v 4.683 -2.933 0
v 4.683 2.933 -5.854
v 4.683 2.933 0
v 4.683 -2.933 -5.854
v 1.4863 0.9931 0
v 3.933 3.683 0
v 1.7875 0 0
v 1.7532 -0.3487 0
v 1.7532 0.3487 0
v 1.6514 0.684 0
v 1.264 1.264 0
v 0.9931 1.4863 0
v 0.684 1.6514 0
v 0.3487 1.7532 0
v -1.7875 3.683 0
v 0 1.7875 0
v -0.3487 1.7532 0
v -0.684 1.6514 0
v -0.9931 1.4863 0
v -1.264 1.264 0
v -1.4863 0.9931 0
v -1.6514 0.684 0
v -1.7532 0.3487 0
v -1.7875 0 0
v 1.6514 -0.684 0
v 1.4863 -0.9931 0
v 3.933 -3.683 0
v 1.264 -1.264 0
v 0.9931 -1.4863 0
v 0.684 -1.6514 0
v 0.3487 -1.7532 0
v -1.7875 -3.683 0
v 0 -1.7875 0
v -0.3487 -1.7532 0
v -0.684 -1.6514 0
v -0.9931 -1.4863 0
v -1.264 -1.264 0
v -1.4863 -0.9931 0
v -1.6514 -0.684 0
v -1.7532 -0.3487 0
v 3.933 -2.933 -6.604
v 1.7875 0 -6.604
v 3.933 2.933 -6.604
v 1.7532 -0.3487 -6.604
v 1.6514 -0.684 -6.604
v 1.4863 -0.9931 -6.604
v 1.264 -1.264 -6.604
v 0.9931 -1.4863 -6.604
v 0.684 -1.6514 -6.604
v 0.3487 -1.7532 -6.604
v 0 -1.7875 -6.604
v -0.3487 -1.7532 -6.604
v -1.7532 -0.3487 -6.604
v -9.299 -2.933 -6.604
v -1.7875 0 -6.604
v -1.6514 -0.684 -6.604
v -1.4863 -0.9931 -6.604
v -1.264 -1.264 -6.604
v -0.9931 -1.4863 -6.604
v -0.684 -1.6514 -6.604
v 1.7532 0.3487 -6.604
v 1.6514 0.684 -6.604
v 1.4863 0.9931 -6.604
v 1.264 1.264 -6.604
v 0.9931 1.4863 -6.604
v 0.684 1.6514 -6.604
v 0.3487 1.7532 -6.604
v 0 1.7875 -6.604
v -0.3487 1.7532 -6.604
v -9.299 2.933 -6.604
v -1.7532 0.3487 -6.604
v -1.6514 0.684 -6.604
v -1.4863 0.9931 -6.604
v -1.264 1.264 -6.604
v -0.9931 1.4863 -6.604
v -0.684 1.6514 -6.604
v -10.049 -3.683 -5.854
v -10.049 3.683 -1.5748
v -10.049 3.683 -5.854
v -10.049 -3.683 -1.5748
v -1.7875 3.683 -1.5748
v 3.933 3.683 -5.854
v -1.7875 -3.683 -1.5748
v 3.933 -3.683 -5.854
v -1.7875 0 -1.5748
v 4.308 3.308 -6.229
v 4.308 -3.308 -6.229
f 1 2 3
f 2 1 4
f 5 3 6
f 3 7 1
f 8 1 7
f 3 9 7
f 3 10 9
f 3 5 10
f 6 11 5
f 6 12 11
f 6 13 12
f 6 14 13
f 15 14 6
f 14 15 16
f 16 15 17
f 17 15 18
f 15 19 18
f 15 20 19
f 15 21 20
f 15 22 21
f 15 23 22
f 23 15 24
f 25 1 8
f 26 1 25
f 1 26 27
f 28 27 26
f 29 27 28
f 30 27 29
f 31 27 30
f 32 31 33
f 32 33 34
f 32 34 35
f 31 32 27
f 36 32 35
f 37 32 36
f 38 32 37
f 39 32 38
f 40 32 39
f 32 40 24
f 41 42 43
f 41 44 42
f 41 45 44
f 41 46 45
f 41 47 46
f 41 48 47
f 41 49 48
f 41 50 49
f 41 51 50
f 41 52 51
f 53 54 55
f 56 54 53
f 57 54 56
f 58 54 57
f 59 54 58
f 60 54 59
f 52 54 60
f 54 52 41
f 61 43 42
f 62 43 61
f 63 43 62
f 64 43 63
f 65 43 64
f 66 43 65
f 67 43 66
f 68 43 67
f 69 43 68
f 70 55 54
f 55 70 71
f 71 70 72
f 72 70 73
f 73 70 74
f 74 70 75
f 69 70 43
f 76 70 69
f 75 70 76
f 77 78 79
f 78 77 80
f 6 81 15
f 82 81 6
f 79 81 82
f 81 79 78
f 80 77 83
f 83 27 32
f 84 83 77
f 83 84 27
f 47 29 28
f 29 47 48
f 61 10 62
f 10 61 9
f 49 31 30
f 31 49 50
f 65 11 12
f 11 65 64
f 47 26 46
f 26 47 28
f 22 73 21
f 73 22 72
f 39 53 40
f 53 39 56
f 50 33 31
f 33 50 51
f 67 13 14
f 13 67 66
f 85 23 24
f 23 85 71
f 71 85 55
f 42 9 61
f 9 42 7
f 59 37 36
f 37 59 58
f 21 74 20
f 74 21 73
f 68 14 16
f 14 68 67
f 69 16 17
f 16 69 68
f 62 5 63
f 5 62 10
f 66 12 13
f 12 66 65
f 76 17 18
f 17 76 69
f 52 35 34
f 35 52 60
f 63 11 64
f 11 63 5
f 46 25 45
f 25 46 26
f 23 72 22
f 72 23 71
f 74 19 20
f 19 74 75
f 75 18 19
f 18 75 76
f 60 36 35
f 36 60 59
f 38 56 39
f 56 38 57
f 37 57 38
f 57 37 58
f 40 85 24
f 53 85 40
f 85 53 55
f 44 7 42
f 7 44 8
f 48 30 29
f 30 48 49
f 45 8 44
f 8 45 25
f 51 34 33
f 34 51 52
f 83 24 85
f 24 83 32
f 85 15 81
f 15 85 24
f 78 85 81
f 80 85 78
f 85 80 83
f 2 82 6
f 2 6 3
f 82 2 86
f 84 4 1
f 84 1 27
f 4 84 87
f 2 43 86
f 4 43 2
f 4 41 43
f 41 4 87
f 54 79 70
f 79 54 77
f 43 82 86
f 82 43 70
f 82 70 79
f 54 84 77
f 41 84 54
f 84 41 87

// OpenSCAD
// OpenSCAD 2019.05
// Tiva Case - enclosure, REV-001
// Joe Haas, KE0FF, 12/16/2021
// This is an enclosure for an EK-TM4C123GXL LaunchPad board and a custom LaunchPad
//	carrier board.
//
// Rev-004, 1/2/2022
//	Final adjustments from rev3 printing
//	added edge chamfers to top & bot at the platen faces of each part.  Softens the edge and
//		helps to counteract "elephant-foot" expansion.
//	increased depth of countersinks
//	increased size of USB port
//	removed SMA pilots for RF3&4 and replaced with "spot-face" that is 0.7mm thick
//	added another 0.5mm to lip0 for more edge clearance for LP board
//	Fixed 2-manifold rendering error in top piece (added 0.001mm to the "x" location
//		of the two corner rounds furthest from the rev text)
//
// Rev-003 (bot), 12/24/2021
//	(bot) added lid mtg countersinks (x6)
//
// Rev-003 (lid), 12/23/2021
//	(lid) added lip0 clips to remove interference
//
// Rev-002, 12/21/2021
//	incorporated fixes from first print run
//	increased lid thickness to provide room for stock LP board
//
// Rev-001, 12/16/2021
//	initial code -- copied from uxcover

//----------------------------------------------------------------------------------------------------------------------
// User defined parameters.  Modify these to suit a particular application
// NOTE: All data in this file is in mm
//----------------------------------------------------------------------------------------------------------------------
// parametric variables:

i2m = 25.4;
m2m = i2m/1000;

ix = 1.2*25.4;
ex = 0.25*25.4;
px = ix + ex;
py = .49*25.4;
pz = .25*25.4;
nx = 0.05*25.4;
nz = .12*25.4;
pitch = 0.1 * 25.4;
pdia = .05*25.4;
offsx = .08*25.4;
bz = 0.05*25.4;

wy = 0.1*25.4;

// NOTES ///////////////////
// stoff() and off_stoff() are the RC-96 standoffs.  Set stoff85 = 0;
//
// off_stoff85(), and cap85() are the RC-85 standoffs using two machine-pin standoff sockets at U4
// stoff() with stoff85 = .44*i2m is the RC-85 standoff
//
///////////////////////////////////////////////////////////

// RC-96:
//stoff85 = 0;	    // uncomment for all RC96
//stoff();
//off_stoff();

// RC-85 standoff delta (2 machine-pin sockets):
stoff85 = 0.66*i2m; // uncomment for all RC85
//stoff();
//off_stoff85();
cap85();

///////////////////////////////////////////////////////////
sdia = 0.375*i2m;
sdia2 = 0.4*i2m;

tdia4 = (0.07*i2m)+.4;
cham = .6;
halfht = (0.5*i2m)-(cham*2) + stoff85;

dia4 = (0.125*i2m)+.4;
oox = 0.29*i2m;
ooy = 0.29*i2m;
ooz = 0.13*i2m;
oht = (0.5*i2m);
pthk = 0.063*i2m;
chame = 1.5;

// 0.5" standoff
module stoff(){

	difference(){
		union(){
			if(stoff85 == 0){
				translate([0,0,cham]) cylinder(r=sdia/2, h=halfht, $fn=32);
			}else{
				translate([0,0,cham]) cylinder(r=sdia2/2, h=halfht, $fn=32);
			}
			if(stoff85 == 0){
				cylinder(r2=sdia/2, r1=((sdia)/2)-cham, h=cham, $fn=32);
				translate([0,0,halfht+cham]) cylinder(r1=sdia/2, r2=((sdia)/2)-cham, h=cham, $fn=32);
			}else{
				cylinder(r2=sdia2/2, r1=((sdia2)/2)-cham, h=cham, $fn=32);
				translate([0,0,halfht+cham]) cylinder(r1=sdia2/2, r2=((sdia2)/2)-cham, h=cham, $fn=32);
			}
		}
		cylinder(r=tdia4/2, h=3.5*i2m, $fn=32, center=true);
		translate([0,0,halfht+(2*cham)-(tdia4)+.2]) cylinder(r2=(2*tdia4/2), r1=0, h=tdia4, $fn=16);
		if(stoff85 != 0){
			translate([0,0,-.2]) cylinder(r1=(2*tdia4/2), r2=0, h=tdia4, $fn=16);
		}
	}
}

//cap85();

module cap85(){
dx = 1;
	translate([-oox/2,0,-2*ooz]) difference(){
		translate([dx,0,ooz]) cube([2*oox,ooy,2*ooz], center=true);
		translate([oox/2,0,0]) cylinder(r=dia4/2, h=1*i2m, $fn=32, center=true);
		translate([(-oox/2)-(dia4/2),0,(3*ooz)-pthk+(0.001*i2m)]) cube([2*oox,1.1*ooy,2*ooz], center=true);
		// edge chams
		translate([oox+dx,ooy/2,0]) cylinder(r=chame/2, h=3*oht, $fn=4, center=true);
		translate([-(oox+dx),ooy/2,0]) cylinder(r=chame/2, h=3*oht, $fn=4, center=true);
		translate([(oox+dx),-ooy/2,0]) cylinder(r=chame/2, h=3*oht, $fn=4, center=true);
		translate([-(oox+dx),-ooy/2,0]) cylinder(r=chame/2, h=3*oht, $fn=4, center=true);
		translate([(oox+dx),0,0]) rotate([90,0,0]) cylinder(r=chame/2, h=3*oht, $fn=4, center=true);
		translate([-(oox-dx),0,0]) rotate([90,0,0]) cylinder(r=chame/2, h=3*oht, $fn=4, center=true);
		translate([dx,ooy/2,0]) rotate([0,90,0]) cylinder(r=chame/2, h=3*oht, $fn=4, center=true);
		translate([dx,-ooy/2,0]) rotate([0,90,0]) cylinder(r=chame/2, h=3*oht, $fn=4, center=true);
	}
}
//off_stoff();
//cylinder(r=.5,h=.5*i2m);

module off_stoff(){

	difference(){
		union(){
			// mtg tab
			translate([0,0,ooz/2]) cube([oox,ooy,ooz], center=true);
			// leg
			translate([(.75*oox)-.01,0,(oht-pthk)/2]) cube([.5*oox,ooy,oht+pthk], center=true);
		}
		cylinder(r=dia4/2, h=1.5*i2m, $fn=32, center=true);
//		translate([(oox/4)+(oox/2)-.1,0,((oht-ooz)/2)+ooz]) cube([(oox+.02)/2,ooy+.01,oht-ooz+.01], center=true);
		// edge chams
		translate([oox,ooy/2,0]) cylinder(r=chame/2, h=3*oht, $fn=4, center=true);
		translate([oox,-ooy/2,0]) cylinder(r=chame/2, h=3*oht, $fn=4, center=true);
		translate([oox,-ooy/2,-pthk]) rotate([90,0,0]) cylinder(r=chame/2, h=3*oht, $fn=4, center=true);
		translate([oox,-ooy/2,oht]) rotate([90,0,0]) cylinder(r=chame/2, h=3*oht, $fn=4, center=true);
	}
}

//off_stoff85();
//cylinder(r=.5,h=.5*i2m);

module off_stoff85(){
oht85 = oht + stoff85;

	difference(){
		union(){
			translate([0,0,ooz/2]) cube([oox,ooy,ooz], center=true);
			translate([oox-.01,0,(oht85)/2]) cube([oox,ooy,oht85], center=true);
		}
		cylinder(r=dia4/2, h=1.5*i2m, $fn=32, center=true);
		translate([(oox/4)+(oox/2)-.1,0,((oht85-ooz)/2)+ooz]) cube([(oox+.02)/2,ooy+.01,oht85-ooz+.01], center=true);
		// edge chams
		translate([(oox/2)+oox,ooy/2,0]) cylinder(r=chame/2, h=3*oht85, $fn=4, center=true);
		translate([(oox/2)+oox,-ooy/2,0]) cylinder(r=chame/2, h=3*oht85, $fn=4, center=true);
		translate([(oox/2)+oox,-ooy/2,-pthk]) rotate([90,0,0]) cylinder(r=chame/2, h=3*oht85, $fn=4, center=true);
		translate([(oox/2)+oox,-ooy/2,oht85]) rotate([90,0,0]) cylinder(r=chame/2, h=3*oht85, $fn=4, center=true);
	}
}

///////////////////////////////////////////////////////////
// 16-DIP WW-socket depth-cut jig

//dip_cut();

module dip_cut(){
cham = 1;
chamc = 2.5;
oax = .6*i2m; //.8*i2m;
oay = 1.1*i2m;
oaz = 0.22 * i2m; //(.12*i2m)+(62*m2m);

	difference(){
		cube([oax,oay,oaz], center=true);
		for(y=[0:.1*i2m:.7*i2m]){
			translate([-150*m2m,y-(350*m2m),0]) dip_hole(dz=oaz);
			translate([150*m2m,y-(350*m2m),0]) dip_hole(dz=oaz);
		}
		// chams
		translate([-oax/2,-oay/2,0]) cylinder(r=chamc/2, h=10, $fn=4, center=true);
		translate([-oax/2,oay/2,0]) cylinder(r=chamc/2, h=10, $fn=4, center=true);
		translate([oax/2,-oay/2,0]) cylinder(r=chamc/2, h=10, $fn=4, center=true);
		translate([oax/2,oay/2,0]) cylinder(r=chamc/2, h=10, $fn=4, center=true);

		translate([0,oay/2,oaz/2]) rotate([0,90,0]) cylinder(r=chamc/2, h=30, $fn=4, center=true);
		translate([0,-oay/2,oaz/2]) rotate([0,90,0]) cylinder(r=chamc/2, h=30, $fn=4, center=true);
		translate([oax/2,0,oaz/2]) rotate([90,0,0]) cylinder(r=chamc/2, h=30, $fn=4, center=true);
		translate([-oax/2,0,oaz/2]) rotate([90,0,0]) cylinder(r=chamc/2, h=30, $fn=4, center=true);

		translate([0,oay/2,-oaz/2]) rotate([0,90,0]) cylinder(r=cham/2, h=30, $fn=4, center=true);
		translate([0,-oay/2,-oaz/2]) rotate([0,90,0]) cylinder(r=cham/2, h=30, $fn=4, center=true);
		translate([oax/2,0,-oaz/2]) rotate([90,0,0]) cylinder(r=cham/2, h=30, $fn=4, center=true);
		translate([-oax/2,0,-oaz/2]) rotate([90,0,0]) cylinder(r=cham/2, h=30, $fn=4, center=true);
	}
}

module dip_hole(dz=1){
//hdia = .055*i2m;		// 55mils is cut version, 51 mils is header shipping shroud
hdia = .051*i2m;
csd = .08*i2m;

	cylinder(r=hdia/2, h=10, $fn=16, center=true);
	translate([0,0,(dz/2)+.01-(csd/2)]) cylinder(r2=csd/2, r1=0, h=csd/2, $fn=16);
	translate([0,0,-(dz/2)-.01]) cylinder(r1=csd/2, r2=0, h=csd/2, $fn=16);
}


/////////////////////////
// debug artifacts
//
// X-rulers
//#translate([-.69,0,0]) cube([0.01,30,50]);	// ruler
//#translate([175.41,0,0]) cube([0.01,30,50]);	// inside main void ruler 1
//#translate([1.67,0,0]) cube([0.01,30,50]);	// inside main void ruler 2
//#translate([175.34,0,0]) cube([0.01,30,50]);	// outside shroud ruler 2
// Y-rulers
//#translate([0,23.81,0]) cube([180,0.01,50]);	// ruler
//#translate([0,22.36 ,0]) cube([180,0.01,50]);	// ruler
// Z-rulers
//#translate([0,0,0]) cube([10,40,.01]);	// ruler
//#translate([0,0,2.04]) cube([9,40,.01]);	// ruler

// EOF
